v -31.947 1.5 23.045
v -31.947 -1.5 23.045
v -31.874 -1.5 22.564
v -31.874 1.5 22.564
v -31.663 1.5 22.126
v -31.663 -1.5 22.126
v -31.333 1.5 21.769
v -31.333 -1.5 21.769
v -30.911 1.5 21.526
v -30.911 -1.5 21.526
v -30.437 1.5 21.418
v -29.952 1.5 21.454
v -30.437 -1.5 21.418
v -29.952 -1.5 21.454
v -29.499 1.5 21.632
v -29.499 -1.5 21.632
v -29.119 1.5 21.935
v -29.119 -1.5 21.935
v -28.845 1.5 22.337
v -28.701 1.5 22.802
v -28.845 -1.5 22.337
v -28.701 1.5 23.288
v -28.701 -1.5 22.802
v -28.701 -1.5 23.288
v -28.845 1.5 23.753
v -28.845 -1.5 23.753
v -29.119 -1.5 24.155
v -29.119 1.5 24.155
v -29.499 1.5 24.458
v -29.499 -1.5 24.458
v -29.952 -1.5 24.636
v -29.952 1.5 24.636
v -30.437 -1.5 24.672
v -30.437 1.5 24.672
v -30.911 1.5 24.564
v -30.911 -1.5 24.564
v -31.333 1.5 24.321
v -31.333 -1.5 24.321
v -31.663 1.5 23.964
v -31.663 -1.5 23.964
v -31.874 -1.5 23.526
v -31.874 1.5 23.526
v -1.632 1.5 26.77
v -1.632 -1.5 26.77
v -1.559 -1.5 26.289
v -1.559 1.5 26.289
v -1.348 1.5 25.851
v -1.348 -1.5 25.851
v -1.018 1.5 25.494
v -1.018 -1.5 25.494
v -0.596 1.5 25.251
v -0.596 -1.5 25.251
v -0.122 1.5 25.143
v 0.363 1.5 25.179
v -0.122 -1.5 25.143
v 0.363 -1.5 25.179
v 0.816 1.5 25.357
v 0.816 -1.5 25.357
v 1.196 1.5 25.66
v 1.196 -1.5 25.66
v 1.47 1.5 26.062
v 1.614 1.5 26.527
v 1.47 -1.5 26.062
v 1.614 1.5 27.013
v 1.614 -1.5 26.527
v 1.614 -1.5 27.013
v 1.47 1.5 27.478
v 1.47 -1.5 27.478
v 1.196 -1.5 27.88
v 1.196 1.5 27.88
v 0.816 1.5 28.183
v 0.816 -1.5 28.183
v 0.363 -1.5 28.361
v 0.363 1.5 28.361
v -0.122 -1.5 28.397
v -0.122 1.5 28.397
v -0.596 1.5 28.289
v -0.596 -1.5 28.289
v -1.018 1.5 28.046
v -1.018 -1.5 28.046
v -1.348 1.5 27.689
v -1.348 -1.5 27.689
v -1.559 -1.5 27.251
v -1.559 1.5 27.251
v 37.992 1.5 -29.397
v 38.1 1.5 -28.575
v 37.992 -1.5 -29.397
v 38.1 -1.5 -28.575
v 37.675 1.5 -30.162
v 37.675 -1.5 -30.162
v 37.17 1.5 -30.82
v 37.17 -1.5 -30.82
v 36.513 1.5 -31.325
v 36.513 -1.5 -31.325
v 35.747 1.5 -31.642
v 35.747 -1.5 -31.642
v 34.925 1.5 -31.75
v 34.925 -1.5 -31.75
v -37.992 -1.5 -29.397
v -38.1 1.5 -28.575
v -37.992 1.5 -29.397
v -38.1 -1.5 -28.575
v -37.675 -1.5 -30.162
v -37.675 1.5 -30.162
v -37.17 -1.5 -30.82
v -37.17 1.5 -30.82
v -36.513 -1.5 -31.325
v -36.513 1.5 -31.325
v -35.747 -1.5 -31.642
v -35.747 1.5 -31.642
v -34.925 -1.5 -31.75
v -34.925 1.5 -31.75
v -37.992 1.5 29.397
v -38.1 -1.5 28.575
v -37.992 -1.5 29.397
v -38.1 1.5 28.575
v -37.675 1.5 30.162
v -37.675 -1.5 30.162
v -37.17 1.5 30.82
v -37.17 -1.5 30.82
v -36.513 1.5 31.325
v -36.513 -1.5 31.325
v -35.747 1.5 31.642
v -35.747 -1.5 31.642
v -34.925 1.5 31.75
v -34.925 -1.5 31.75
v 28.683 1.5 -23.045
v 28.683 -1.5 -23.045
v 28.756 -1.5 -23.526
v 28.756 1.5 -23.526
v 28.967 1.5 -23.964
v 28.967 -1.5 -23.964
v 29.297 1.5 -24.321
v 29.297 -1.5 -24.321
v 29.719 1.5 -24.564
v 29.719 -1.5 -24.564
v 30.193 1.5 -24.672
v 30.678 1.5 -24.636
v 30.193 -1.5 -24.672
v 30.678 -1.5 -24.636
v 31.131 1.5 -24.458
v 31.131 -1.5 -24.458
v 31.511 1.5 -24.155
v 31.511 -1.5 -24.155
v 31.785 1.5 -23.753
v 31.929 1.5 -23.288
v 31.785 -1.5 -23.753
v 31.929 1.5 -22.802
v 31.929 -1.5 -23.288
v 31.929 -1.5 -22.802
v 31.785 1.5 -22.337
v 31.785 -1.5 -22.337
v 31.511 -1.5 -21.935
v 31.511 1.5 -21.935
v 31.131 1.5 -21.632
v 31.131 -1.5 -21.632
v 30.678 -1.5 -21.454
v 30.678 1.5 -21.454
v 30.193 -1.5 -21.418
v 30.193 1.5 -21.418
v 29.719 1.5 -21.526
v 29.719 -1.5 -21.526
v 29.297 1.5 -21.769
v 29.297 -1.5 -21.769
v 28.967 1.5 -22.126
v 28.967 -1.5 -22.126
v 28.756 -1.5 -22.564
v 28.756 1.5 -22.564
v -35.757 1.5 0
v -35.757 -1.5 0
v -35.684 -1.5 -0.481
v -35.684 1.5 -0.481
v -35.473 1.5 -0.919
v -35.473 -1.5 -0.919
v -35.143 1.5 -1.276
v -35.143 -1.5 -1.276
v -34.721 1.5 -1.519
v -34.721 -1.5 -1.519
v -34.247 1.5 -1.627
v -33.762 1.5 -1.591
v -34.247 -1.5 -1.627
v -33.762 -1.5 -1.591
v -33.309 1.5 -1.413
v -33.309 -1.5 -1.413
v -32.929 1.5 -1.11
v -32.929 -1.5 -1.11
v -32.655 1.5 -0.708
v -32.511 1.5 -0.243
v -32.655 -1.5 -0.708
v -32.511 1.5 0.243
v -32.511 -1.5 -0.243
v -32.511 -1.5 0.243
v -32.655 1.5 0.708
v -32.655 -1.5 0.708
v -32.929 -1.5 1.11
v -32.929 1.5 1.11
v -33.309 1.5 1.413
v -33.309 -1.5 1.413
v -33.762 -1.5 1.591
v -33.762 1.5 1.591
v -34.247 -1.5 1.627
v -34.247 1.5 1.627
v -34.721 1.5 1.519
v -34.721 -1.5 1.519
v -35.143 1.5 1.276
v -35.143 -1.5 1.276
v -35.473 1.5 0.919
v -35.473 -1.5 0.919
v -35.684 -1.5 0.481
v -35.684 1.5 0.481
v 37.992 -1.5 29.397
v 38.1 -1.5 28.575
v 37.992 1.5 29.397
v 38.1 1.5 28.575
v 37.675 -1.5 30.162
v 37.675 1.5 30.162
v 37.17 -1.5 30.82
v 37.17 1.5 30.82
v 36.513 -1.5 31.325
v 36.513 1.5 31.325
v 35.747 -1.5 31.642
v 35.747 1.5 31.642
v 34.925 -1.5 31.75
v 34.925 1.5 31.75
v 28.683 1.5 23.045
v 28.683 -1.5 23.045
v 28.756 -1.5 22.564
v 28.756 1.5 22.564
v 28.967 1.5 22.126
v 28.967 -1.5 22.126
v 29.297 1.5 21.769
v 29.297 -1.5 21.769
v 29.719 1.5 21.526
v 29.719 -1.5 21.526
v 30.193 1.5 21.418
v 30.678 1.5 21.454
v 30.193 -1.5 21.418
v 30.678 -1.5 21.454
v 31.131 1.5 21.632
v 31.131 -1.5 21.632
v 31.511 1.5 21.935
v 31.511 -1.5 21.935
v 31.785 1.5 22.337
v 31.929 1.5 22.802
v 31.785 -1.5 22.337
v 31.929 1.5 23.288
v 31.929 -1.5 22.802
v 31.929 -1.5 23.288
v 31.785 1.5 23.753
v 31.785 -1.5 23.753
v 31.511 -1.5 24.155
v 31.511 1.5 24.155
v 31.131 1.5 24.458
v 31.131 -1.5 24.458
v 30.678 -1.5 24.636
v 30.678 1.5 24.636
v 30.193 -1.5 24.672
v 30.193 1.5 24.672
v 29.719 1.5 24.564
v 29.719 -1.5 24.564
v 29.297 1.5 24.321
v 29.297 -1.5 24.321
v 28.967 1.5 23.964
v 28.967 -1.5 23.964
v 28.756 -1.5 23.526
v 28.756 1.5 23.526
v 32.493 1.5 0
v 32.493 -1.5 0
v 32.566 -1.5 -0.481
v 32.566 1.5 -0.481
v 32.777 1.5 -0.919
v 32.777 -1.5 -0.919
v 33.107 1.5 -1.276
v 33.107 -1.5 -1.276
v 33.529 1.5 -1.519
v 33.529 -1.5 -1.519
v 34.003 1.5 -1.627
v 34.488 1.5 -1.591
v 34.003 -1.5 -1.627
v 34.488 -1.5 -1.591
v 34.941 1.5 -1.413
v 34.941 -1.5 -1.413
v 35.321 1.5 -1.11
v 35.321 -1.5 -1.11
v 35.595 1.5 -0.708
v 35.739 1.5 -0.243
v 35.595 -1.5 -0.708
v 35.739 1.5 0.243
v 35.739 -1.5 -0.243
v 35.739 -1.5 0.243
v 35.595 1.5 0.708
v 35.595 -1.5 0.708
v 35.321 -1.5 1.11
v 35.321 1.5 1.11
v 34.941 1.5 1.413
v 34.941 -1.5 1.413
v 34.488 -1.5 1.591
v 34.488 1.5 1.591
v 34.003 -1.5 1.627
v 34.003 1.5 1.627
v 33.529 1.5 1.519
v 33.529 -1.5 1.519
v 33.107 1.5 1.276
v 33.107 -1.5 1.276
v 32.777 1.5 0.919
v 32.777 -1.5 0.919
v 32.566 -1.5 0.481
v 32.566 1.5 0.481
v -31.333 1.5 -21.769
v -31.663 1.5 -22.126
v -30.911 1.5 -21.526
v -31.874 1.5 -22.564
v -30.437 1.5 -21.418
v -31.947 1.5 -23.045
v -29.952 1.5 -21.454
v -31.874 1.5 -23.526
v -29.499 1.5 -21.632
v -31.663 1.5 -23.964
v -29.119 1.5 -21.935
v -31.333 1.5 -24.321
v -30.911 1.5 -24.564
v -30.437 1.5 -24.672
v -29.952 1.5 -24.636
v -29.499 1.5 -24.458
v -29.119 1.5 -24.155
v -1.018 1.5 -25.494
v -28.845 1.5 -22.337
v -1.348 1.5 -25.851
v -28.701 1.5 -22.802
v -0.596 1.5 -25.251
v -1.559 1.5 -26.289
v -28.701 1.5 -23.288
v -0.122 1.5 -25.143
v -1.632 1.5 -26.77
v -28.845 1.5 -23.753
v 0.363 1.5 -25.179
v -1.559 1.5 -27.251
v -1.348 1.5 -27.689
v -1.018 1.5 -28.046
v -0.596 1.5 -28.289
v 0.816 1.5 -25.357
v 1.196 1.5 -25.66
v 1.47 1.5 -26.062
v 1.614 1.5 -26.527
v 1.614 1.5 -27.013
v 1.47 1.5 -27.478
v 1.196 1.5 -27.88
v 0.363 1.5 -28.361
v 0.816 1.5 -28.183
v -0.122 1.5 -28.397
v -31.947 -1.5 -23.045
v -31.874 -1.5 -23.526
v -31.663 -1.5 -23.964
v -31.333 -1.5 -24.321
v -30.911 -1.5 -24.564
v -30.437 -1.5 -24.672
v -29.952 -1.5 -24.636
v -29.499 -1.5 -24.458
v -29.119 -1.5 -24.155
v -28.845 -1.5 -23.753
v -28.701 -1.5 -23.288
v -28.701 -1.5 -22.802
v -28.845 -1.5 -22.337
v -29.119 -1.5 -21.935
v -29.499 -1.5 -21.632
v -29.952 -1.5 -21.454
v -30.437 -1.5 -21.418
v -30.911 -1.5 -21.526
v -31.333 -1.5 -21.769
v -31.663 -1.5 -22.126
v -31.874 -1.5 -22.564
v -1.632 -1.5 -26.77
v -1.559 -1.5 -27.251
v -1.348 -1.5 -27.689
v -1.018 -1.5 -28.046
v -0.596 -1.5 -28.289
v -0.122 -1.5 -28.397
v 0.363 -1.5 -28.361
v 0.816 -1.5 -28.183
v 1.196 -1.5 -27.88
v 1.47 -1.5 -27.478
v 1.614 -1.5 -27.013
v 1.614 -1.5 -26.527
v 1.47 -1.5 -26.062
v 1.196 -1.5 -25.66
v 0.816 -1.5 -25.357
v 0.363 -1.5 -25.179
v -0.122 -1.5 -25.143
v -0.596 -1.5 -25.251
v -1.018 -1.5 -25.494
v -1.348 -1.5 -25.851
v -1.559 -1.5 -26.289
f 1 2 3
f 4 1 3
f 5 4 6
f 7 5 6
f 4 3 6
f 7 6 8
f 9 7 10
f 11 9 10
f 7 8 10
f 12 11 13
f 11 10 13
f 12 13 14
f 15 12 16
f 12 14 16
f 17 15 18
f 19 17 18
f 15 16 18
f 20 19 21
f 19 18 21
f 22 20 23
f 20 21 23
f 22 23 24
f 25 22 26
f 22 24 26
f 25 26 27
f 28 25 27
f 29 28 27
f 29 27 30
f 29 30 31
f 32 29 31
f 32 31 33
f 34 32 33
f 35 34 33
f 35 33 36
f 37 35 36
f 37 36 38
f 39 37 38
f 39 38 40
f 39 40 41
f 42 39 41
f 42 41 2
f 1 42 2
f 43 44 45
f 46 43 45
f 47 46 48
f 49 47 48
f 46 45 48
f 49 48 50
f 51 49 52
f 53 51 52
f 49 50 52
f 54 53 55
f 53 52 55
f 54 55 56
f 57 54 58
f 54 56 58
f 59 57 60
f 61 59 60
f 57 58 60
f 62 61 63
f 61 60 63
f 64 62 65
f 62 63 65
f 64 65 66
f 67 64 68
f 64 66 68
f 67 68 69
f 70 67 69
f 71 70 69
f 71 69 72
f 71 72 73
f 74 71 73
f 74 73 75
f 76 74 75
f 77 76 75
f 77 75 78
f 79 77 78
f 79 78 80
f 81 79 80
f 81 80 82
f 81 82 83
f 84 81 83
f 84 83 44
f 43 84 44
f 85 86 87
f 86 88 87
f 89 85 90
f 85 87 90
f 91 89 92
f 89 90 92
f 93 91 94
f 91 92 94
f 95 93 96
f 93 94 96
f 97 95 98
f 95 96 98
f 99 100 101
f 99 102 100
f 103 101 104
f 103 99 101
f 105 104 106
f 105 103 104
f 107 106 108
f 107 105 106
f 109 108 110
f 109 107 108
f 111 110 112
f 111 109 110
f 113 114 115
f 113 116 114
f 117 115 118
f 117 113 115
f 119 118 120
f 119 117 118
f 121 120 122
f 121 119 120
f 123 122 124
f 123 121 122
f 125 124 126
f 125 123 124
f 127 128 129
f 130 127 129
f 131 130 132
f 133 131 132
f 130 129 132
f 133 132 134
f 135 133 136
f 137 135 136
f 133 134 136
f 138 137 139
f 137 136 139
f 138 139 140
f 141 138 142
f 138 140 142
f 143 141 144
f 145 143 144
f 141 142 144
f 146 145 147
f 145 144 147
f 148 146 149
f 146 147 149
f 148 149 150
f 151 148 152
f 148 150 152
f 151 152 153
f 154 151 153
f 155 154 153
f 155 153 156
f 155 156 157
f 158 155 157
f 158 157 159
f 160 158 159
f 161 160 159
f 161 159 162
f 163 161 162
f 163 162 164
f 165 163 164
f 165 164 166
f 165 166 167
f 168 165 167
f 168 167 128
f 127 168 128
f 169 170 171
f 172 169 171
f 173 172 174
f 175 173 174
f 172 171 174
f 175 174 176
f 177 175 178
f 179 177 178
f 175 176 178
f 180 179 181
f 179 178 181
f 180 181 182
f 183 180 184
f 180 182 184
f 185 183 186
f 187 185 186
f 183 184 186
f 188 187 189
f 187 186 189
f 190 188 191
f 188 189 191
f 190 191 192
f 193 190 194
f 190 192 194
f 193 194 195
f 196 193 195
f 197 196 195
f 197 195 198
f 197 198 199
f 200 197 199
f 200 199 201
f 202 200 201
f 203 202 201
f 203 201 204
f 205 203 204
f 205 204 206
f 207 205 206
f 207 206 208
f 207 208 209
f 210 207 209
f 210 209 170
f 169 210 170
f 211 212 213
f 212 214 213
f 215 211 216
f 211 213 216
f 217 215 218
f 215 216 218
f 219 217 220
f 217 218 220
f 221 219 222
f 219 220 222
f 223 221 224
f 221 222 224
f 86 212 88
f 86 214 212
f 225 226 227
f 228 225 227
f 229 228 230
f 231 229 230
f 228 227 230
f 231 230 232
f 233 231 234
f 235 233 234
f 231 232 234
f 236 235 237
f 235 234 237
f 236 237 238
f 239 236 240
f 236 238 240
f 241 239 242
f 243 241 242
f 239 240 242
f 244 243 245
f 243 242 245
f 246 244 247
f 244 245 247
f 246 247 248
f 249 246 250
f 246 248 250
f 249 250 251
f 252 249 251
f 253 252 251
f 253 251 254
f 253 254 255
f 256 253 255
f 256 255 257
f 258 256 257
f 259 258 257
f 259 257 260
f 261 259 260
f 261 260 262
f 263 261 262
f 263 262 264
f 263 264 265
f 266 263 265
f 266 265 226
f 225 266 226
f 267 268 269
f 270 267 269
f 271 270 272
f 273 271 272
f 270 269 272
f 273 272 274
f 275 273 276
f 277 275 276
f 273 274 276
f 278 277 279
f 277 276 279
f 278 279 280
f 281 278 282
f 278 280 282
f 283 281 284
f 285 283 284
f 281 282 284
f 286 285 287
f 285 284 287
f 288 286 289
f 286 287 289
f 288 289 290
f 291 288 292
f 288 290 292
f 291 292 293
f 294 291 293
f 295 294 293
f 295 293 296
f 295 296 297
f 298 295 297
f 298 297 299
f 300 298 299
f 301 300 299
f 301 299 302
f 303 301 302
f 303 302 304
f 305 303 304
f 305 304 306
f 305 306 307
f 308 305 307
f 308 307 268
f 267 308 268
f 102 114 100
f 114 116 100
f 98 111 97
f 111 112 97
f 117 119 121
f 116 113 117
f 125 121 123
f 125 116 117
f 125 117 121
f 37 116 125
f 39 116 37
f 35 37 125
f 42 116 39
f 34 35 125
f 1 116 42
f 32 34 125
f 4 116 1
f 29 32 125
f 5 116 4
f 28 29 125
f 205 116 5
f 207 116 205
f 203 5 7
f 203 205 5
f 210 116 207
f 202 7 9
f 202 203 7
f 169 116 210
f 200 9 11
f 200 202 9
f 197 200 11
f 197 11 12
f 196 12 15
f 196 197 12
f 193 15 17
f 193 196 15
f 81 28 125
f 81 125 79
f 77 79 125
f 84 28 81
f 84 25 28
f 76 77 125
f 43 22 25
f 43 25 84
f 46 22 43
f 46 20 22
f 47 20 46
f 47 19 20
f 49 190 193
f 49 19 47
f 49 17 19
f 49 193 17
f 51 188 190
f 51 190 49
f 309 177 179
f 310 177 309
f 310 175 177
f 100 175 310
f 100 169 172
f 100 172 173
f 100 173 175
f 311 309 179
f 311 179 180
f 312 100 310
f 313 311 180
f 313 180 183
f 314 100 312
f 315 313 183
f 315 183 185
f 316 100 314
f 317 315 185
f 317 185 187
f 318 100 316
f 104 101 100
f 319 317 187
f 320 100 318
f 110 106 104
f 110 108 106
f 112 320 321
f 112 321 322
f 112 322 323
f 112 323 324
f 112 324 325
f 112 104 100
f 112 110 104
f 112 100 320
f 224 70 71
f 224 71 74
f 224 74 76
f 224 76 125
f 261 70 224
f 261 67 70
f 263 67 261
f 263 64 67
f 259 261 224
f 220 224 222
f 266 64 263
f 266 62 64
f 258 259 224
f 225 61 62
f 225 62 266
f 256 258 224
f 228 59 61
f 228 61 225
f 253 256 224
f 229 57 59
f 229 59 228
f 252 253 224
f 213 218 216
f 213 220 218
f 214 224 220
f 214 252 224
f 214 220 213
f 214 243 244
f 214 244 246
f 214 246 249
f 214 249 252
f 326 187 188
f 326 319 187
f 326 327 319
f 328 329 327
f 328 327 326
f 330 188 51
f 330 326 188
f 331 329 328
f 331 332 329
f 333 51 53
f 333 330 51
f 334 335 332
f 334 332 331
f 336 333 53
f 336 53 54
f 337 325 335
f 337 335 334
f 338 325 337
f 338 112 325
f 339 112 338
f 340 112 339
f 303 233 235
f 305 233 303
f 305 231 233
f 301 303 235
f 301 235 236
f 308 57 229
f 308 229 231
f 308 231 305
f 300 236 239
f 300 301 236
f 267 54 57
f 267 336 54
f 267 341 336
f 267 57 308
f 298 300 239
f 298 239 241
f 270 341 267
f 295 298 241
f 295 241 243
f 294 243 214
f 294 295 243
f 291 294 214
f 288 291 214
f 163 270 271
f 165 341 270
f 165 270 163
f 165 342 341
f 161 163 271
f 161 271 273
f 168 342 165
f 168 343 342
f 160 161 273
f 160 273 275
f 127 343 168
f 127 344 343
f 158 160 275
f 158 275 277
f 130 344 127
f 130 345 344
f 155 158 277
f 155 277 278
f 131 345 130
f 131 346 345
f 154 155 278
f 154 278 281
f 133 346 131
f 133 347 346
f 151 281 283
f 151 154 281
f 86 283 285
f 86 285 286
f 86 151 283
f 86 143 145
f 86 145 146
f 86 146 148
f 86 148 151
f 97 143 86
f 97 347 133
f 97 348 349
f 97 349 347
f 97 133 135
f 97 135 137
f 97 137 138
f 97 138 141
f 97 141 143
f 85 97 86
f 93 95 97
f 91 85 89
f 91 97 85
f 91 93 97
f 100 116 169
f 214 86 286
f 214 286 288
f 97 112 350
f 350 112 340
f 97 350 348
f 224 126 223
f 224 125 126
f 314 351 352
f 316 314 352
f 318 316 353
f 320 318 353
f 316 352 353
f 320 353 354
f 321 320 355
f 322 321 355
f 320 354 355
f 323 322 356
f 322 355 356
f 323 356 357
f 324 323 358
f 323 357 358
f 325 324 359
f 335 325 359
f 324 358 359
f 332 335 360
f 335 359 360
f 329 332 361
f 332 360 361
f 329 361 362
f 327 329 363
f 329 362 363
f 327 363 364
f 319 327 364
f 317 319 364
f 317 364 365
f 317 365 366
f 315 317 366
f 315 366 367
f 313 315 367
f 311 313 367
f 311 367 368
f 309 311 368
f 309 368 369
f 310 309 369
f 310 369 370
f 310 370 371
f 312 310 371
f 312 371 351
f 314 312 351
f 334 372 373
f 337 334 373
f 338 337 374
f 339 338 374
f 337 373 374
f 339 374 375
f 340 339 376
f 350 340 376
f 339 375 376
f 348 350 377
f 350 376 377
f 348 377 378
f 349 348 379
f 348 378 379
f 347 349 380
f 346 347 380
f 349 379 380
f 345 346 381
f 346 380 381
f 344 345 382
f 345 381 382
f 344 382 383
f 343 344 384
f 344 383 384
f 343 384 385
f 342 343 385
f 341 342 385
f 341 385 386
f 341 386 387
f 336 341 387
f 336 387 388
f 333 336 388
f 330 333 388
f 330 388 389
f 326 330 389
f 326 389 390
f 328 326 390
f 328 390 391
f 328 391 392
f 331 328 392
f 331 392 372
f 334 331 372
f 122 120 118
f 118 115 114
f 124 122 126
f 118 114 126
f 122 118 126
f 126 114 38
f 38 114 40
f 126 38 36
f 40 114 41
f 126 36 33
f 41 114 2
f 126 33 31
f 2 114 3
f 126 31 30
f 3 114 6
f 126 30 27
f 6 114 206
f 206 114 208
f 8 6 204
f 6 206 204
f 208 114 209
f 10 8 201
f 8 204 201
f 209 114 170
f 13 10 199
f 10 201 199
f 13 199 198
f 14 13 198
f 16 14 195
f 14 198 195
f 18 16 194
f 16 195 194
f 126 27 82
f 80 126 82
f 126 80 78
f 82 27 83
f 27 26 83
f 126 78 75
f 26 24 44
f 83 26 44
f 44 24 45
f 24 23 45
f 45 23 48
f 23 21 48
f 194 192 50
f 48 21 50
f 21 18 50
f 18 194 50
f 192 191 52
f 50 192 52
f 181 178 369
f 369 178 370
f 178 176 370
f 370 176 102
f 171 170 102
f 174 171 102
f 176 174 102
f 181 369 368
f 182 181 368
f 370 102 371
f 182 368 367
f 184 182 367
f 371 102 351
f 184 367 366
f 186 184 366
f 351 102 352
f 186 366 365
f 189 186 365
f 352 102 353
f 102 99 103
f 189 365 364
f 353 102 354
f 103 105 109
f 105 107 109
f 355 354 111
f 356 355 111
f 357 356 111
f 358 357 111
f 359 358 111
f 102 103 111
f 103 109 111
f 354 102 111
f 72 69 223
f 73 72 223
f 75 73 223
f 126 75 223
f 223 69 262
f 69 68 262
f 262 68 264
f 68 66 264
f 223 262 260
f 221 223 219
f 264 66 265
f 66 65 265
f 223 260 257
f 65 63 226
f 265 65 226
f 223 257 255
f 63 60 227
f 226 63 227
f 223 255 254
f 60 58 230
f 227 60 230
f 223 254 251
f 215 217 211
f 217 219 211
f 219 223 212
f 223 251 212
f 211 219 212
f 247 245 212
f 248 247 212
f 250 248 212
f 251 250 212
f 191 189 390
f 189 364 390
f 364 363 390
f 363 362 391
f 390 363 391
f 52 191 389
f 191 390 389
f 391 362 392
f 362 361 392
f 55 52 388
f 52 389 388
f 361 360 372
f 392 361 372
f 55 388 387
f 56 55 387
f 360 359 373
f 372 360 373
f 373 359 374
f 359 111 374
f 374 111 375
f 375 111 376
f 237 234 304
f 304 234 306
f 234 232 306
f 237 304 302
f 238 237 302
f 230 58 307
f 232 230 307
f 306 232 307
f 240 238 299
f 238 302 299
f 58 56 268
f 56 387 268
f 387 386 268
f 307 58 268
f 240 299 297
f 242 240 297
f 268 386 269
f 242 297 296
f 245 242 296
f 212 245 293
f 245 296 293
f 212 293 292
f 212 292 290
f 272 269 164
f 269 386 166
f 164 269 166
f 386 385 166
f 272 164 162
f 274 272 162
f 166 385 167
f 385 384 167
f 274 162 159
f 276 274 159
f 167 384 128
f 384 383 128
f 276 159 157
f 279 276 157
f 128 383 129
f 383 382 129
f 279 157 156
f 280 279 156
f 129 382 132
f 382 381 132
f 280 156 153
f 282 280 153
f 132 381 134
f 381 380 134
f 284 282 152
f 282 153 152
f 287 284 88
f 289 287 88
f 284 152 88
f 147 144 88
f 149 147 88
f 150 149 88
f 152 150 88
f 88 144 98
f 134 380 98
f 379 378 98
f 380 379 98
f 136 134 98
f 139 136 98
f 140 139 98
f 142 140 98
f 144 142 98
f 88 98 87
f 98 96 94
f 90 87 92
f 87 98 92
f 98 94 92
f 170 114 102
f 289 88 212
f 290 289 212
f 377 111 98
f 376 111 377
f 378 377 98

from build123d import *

# Parameters (mm, degrees)
SKETCH1_W                 = 76.2
SKETCH1_H                 = 63.5
BOSS_EXTRUDE1_DEPTH       = 1.5
FILLET1_R                 = 3.175
F_4_CLEARANCE_HOLE1_D     = 3.2639
F_4_CLEARANCE_HOLE1_DEPTH = 6.619425513
F_4_CLEARANCE_HOLE1_TIP   = 0.980574487


with BuildPart() as part:
    # Sketch1 → Boss-Extrude1 (new body, symmetric)
    with BuildSketch(Plane(origin=(0, 0, 0), x_dir=(1, 0, 0), z_dir=(0, 1, 0))):
        Rectangle(SKETCH1_W, SKETCH1_H)
    extrude(amount=BOSS_EXTRUDE1_DEPTH, both=True)

    # Fillet1
    fillet1_edges = [part.edges().sort_by_distance(p)[0] for p in [
        (38.1, 0, 31.75),
        (-38.1, 0, 31.75),
        (-38.1, 0, -31.75),
        (38.1, 0, -31.75),
    ]]
    fillet(fillet1_edges, radius=FILLET1_R)

    # #4 Clearance Hole1
    with Locations(Plane(origin=(0, 1.5, 0), x_dir=(1, 0, 0), z_dir=(0, 1, 0))):
        with Locations((-34.125, 0), (-30.315, -23.045), (0, -26.77), (30.315, -23.045), (34.125, 0), (30.315, 23.045), (0, 26.77), (-30.315, 23.045)):
            Hole(F_4_CLEARANCE_HOLE1_D / 2, depth=F_4_CLEARANCE_HOLE1_DEPTH)
            with Locations((0, 0, -(F_4_CLEARANCE_HOLE1_DEPTH + F_4_CLEARANCE_HOLE1_TIP / 2))):  # 118° drill point
                Cone(0, F_4_CLEARANCE_HOLE1_D / 2, F_4_CLEARANCE_HOLE1_TIP, mode=Mode.SUBTRACT)


solid = part.part
